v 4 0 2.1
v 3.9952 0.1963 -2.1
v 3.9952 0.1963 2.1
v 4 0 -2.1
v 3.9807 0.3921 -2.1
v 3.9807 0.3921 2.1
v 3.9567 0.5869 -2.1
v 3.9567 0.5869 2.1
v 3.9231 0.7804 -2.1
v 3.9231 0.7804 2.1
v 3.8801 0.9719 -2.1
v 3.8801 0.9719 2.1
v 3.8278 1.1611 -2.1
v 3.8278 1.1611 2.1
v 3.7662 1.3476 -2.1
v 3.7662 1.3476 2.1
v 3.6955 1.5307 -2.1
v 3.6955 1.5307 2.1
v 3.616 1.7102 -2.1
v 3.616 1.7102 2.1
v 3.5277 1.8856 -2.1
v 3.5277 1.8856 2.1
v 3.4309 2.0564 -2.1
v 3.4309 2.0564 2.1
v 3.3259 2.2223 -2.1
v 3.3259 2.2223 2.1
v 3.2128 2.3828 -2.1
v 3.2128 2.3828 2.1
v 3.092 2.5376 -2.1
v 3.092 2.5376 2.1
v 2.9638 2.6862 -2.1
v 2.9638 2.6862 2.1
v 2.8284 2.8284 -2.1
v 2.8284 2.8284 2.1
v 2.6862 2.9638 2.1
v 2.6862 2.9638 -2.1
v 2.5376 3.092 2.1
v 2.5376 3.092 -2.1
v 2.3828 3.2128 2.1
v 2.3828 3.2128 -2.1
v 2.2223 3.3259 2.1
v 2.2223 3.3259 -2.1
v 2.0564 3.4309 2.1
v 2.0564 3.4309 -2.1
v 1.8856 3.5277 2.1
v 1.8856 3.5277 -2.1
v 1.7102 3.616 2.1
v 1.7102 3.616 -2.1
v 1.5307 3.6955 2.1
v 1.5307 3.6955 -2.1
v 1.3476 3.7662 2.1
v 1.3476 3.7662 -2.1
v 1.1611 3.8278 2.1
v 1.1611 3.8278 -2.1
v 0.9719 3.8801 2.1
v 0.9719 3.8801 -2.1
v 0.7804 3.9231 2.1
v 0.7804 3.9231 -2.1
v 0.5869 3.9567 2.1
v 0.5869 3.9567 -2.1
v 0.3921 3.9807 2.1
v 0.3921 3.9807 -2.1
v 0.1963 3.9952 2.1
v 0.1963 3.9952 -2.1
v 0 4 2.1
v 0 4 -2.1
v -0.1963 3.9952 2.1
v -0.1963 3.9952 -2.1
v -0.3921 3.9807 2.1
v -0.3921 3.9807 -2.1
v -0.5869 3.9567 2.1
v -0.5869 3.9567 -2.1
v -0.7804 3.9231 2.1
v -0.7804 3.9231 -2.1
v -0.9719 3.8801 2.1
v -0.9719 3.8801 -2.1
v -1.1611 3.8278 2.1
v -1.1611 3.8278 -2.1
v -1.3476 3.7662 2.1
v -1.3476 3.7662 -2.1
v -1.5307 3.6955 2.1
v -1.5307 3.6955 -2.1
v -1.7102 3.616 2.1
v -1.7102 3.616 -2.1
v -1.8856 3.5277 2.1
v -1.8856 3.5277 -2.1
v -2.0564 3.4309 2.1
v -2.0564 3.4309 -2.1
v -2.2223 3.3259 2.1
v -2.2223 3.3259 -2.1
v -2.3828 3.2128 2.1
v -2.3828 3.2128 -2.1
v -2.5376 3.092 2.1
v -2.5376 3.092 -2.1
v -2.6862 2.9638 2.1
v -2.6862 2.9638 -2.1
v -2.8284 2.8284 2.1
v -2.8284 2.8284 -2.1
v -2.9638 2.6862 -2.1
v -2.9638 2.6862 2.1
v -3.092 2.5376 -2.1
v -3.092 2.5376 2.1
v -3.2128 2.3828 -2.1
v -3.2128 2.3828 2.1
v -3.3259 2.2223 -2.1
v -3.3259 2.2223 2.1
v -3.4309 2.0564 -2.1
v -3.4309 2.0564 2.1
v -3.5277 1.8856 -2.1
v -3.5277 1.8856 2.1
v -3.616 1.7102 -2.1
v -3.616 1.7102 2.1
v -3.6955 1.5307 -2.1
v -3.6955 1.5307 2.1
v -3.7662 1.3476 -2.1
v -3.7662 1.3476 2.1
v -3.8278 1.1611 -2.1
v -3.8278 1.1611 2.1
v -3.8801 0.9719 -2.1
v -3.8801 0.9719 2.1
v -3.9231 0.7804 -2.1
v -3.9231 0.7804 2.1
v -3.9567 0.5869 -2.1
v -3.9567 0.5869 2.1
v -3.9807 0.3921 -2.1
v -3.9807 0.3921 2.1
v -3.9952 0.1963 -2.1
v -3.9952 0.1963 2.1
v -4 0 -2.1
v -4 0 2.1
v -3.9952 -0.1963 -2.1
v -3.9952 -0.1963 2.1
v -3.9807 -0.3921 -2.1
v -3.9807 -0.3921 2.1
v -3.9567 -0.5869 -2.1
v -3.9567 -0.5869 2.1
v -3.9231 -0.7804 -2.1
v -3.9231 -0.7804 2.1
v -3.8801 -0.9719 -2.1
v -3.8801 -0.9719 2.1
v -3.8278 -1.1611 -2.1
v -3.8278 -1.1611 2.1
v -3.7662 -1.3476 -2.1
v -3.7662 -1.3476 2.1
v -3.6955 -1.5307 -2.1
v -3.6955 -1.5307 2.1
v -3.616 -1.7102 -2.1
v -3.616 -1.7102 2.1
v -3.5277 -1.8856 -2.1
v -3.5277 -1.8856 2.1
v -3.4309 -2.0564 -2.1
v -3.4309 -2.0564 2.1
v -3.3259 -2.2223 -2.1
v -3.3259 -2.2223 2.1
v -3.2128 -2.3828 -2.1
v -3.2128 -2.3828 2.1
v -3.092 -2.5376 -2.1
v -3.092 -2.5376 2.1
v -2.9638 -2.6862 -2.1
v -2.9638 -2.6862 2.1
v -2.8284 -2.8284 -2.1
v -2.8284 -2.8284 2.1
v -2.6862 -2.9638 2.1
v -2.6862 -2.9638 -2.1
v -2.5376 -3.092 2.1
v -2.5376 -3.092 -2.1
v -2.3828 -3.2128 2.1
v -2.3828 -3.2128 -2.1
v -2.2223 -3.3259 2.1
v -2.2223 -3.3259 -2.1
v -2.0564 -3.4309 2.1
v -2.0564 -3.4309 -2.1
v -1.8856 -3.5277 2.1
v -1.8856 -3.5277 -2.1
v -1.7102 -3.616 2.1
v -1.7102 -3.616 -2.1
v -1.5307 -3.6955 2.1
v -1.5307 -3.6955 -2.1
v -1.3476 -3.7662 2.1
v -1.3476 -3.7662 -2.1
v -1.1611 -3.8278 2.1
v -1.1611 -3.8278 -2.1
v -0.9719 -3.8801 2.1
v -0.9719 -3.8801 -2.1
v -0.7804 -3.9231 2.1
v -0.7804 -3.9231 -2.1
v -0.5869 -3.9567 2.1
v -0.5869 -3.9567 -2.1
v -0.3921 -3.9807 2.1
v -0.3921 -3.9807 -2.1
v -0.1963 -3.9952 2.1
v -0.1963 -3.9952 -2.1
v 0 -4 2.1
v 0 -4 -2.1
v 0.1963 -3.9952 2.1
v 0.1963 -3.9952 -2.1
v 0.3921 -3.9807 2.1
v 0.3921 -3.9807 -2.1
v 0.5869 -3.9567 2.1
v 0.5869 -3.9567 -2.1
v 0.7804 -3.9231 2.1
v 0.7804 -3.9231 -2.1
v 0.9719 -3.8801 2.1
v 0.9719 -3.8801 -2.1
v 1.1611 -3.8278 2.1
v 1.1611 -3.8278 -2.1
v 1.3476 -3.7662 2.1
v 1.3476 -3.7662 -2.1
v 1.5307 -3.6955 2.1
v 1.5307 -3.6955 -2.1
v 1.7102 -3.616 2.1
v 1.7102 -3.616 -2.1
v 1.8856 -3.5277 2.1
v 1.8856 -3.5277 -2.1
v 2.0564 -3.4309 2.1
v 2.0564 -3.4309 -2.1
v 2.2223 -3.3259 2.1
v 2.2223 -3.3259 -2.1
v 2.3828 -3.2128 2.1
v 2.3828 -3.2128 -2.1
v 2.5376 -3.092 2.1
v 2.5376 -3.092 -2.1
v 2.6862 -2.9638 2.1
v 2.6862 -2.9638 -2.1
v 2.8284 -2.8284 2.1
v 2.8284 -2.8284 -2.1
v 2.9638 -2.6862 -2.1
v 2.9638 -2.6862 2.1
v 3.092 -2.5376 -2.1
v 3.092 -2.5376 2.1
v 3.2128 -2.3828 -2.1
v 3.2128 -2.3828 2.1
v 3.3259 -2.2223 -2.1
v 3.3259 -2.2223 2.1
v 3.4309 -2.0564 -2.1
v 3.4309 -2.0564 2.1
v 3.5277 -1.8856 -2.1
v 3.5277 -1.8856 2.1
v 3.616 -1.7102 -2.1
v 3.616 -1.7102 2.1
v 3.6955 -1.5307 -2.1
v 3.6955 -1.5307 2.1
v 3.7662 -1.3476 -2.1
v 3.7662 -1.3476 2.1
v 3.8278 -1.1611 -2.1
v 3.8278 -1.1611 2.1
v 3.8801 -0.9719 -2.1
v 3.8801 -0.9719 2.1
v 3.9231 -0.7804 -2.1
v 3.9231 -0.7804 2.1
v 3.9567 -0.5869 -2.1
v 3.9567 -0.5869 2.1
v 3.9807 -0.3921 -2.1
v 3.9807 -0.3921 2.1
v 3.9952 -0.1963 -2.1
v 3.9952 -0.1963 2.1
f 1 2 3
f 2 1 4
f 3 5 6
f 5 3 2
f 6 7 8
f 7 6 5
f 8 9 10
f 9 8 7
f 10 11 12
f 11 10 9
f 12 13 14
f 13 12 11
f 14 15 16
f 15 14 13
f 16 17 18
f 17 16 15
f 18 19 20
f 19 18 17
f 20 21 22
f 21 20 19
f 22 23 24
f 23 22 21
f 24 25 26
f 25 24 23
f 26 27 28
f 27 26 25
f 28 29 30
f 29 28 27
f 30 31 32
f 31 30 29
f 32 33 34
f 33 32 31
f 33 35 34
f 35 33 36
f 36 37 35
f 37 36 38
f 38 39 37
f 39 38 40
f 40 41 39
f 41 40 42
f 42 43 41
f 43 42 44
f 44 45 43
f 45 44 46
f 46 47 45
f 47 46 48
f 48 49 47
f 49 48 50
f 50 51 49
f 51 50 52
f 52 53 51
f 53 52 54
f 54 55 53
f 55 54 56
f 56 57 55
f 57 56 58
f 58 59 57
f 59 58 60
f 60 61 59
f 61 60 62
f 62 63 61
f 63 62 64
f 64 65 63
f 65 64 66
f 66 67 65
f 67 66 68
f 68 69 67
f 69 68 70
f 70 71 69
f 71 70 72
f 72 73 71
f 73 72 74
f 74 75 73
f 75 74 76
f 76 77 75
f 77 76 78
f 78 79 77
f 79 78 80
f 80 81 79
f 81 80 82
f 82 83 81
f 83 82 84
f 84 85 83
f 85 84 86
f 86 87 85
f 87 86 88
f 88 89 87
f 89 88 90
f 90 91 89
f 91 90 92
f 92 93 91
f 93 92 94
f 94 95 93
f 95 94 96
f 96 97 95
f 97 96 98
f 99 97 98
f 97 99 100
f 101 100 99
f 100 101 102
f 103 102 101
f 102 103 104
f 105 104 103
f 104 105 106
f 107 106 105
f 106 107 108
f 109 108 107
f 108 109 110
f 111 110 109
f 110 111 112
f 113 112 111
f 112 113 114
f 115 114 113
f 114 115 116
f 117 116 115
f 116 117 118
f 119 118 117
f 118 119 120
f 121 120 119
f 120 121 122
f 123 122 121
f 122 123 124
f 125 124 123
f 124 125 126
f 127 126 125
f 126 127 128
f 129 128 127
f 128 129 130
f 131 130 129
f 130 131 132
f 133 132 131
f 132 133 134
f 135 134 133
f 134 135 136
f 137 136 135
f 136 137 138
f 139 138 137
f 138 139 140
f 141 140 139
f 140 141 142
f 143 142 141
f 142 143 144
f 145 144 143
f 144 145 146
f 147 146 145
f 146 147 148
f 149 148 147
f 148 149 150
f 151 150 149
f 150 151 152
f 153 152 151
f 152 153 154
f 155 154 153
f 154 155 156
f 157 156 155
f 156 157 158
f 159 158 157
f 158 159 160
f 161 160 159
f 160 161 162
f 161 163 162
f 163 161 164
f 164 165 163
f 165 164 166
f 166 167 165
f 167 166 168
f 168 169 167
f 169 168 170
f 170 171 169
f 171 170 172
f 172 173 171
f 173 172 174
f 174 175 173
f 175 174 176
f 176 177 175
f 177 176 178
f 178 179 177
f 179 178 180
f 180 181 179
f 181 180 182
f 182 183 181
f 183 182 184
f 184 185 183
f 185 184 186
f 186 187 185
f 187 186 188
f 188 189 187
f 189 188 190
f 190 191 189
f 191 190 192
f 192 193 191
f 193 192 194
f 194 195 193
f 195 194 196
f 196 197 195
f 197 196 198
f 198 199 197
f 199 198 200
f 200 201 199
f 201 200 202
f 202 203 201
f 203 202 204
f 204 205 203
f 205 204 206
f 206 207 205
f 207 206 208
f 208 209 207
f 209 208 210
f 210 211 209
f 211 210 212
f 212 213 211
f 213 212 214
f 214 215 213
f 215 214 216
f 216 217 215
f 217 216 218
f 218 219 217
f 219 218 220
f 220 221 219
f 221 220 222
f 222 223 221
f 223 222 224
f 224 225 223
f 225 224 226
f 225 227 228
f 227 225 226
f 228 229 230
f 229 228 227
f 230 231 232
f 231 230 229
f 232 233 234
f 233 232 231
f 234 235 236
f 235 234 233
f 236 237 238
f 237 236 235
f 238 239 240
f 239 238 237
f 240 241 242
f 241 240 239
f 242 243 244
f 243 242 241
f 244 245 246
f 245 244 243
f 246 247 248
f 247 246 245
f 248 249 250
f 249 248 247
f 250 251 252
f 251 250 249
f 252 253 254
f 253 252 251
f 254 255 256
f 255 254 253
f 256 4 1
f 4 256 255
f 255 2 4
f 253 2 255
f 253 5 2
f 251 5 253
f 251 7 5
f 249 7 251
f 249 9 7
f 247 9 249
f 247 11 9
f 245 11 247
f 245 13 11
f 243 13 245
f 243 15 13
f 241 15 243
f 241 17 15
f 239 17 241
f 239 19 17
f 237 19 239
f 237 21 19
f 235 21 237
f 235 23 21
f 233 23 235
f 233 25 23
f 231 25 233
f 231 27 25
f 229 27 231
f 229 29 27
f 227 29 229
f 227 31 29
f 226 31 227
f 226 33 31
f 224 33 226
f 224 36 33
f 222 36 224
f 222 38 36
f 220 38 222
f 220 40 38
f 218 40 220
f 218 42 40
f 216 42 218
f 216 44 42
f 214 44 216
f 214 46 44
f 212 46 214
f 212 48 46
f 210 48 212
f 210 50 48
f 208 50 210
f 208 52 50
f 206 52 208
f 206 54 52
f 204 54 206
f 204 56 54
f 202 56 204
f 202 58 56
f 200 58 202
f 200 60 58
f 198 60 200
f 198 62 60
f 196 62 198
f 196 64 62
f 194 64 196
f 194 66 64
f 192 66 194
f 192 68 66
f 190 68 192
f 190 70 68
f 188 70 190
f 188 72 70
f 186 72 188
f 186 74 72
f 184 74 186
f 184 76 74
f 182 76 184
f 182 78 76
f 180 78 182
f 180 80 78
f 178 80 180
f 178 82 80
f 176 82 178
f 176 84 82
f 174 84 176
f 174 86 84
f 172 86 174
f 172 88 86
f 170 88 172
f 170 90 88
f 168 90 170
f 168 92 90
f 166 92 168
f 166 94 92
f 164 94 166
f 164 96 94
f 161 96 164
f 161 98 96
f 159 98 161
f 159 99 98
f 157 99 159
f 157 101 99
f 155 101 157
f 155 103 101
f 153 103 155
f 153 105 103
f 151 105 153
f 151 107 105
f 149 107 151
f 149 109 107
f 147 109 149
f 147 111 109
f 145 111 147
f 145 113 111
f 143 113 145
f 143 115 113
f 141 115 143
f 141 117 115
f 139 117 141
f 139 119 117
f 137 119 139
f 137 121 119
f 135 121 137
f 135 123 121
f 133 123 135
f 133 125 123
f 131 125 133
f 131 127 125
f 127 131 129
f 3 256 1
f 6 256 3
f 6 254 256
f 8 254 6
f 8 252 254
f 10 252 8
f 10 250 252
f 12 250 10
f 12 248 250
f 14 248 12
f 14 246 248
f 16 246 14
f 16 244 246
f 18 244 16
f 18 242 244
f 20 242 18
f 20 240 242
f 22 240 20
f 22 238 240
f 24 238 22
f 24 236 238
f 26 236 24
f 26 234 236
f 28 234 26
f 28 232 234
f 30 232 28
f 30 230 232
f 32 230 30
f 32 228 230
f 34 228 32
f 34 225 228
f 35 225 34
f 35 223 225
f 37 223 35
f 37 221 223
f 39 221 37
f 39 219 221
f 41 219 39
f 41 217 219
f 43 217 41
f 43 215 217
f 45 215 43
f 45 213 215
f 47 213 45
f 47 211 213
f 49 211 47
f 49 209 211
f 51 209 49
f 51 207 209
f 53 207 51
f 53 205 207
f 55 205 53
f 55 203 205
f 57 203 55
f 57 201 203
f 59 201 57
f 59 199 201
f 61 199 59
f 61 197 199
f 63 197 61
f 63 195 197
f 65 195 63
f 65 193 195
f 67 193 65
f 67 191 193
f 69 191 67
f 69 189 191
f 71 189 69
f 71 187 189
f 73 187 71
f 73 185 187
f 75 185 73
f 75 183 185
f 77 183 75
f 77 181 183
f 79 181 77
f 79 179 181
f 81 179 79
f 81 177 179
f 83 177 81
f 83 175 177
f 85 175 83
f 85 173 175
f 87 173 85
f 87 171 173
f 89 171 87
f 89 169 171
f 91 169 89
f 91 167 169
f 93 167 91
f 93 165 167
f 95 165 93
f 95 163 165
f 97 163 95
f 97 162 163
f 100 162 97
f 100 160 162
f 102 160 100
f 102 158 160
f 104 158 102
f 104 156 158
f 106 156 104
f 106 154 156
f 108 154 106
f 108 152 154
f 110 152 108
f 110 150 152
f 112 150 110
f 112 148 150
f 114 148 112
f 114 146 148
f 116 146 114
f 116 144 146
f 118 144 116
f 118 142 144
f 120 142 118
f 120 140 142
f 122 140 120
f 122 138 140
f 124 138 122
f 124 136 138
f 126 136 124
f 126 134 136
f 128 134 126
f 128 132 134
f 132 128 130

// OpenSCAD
// Permanent magnet: 8.0mm diameter, 4.2mm tall

outer_diameter_mm = 8.0;  //[4.0:16.0:0.1]
height_mm         = 4.2;  //[2.1:8.4:0.1]

$fn = 128;

module magnet(d=outer_diameter_mm, h=height_mm) {
    // Ensure valid, visible geometry
    d2 = max(d, 0.01);
    h2 = max(h, 0.01);

    color([0.72, 0.45, 0.2])
        cylinder(d=d2, h=h2, center=true);
}

magnet();
